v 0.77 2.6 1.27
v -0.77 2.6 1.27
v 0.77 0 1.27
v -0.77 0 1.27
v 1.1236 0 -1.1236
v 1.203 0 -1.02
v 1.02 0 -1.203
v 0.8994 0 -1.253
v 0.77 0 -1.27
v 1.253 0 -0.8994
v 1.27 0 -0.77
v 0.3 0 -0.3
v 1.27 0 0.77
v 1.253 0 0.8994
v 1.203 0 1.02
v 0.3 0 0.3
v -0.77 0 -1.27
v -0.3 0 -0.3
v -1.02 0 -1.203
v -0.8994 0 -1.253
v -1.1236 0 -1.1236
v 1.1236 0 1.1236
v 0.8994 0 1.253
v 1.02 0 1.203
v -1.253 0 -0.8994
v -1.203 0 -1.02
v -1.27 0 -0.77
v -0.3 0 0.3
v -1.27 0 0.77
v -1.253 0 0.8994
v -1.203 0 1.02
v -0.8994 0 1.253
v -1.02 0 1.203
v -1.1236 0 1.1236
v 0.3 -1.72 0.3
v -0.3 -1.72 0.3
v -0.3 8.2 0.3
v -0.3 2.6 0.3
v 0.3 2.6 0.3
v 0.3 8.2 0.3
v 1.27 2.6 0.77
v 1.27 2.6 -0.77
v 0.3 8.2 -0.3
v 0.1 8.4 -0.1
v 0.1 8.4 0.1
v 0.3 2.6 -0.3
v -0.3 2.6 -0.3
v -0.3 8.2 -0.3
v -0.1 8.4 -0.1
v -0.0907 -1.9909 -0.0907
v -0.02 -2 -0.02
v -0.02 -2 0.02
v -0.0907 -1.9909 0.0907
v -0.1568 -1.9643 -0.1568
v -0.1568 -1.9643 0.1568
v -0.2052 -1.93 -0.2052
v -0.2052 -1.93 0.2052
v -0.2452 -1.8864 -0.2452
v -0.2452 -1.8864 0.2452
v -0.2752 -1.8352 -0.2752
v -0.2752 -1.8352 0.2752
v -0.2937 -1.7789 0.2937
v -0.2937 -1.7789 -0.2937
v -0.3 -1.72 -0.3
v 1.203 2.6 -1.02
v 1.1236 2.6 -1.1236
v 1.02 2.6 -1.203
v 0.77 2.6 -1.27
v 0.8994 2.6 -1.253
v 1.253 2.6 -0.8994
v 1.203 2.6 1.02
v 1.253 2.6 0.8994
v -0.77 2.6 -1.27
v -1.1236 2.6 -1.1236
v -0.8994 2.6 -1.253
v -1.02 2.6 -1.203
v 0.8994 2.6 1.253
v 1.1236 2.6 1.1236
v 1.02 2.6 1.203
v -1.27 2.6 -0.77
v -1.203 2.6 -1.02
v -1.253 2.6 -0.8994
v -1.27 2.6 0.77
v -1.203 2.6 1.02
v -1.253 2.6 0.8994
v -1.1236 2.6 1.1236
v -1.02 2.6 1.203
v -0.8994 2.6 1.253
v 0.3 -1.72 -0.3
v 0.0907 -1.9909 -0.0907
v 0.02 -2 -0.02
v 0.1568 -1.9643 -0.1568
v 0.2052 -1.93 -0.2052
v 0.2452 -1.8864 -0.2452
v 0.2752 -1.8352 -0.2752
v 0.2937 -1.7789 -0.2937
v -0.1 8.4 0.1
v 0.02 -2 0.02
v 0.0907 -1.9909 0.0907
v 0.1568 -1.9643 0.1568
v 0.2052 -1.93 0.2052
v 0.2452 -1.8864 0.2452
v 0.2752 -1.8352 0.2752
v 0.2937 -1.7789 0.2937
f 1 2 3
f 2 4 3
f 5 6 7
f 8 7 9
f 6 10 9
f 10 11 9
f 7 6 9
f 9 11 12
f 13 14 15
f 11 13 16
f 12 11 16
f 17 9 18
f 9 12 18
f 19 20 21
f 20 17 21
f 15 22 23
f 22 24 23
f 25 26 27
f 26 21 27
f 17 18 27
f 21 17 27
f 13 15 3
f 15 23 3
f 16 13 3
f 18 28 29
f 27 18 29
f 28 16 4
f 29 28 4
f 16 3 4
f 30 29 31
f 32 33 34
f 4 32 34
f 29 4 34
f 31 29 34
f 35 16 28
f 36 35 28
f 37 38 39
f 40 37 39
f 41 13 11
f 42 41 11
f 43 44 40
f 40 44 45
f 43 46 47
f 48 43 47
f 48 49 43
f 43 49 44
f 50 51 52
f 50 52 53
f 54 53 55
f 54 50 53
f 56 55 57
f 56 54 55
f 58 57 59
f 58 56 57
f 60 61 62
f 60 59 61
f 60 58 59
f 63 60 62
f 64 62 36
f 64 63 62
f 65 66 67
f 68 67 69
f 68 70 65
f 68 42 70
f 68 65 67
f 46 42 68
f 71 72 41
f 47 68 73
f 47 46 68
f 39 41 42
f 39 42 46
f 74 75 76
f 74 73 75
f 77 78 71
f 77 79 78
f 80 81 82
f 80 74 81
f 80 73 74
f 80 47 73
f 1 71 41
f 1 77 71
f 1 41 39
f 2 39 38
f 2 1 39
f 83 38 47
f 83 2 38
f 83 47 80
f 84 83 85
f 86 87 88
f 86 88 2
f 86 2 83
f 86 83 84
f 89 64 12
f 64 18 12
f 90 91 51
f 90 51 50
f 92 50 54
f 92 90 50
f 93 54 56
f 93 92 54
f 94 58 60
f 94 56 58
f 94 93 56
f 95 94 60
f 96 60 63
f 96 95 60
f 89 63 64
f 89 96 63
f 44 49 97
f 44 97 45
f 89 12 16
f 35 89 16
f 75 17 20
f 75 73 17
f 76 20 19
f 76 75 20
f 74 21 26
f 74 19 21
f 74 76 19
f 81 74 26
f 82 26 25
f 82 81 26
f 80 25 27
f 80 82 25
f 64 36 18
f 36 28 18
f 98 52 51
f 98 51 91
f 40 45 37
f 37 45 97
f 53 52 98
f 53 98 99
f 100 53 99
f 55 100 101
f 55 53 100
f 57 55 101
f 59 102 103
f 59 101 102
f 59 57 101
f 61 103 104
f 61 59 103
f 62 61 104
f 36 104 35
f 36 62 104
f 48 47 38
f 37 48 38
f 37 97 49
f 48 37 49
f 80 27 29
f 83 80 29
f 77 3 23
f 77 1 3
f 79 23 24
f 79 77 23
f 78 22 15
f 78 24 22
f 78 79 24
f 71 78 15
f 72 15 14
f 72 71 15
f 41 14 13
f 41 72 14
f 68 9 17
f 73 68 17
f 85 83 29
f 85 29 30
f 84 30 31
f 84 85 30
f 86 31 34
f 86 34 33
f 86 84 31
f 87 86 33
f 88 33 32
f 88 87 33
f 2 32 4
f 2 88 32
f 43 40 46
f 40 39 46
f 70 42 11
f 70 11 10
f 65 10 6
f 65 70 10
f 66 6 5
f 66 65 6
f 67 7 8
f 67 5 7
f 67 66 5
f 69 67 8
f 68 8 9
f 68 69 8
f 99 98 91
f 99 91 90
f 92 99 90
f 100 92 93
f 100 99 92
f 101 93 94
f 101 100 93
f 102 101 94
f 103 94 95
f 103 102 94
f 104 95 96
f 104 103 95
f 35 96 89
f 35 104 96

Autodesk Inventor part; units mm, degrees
ref_plane "YZ Plane" through (0, 0, 0) normal (1, 0, 0) x (0, 1, 0)
ref_plane "XZ Plane" through (0, 0, 0) normal (0, 1, 0) x (-1, 0, 0)
ref_plane "XY Plane" through (0, 0, 0) normal (0, 0, 1) x (1, 0, 0)
sketch "Sketch1" plane through (0, 0, 0) normal (0, 1, 0) x (-1, 0, 0)
  line L0 (1.27, 1.27) -> (-1.27, 1.27)
  line L1 (-1.27, 1.27) -> (-1.27, -1.27)
  line L2 (-1.27, -1.27) -> (1.27, -1.27)
  line L3 (1.27, -1.27) -> (1.27, 1.27)
  line L4 (1.27, 1.27) -> (-1.27, -1.27) construction
  line L5 (-1.27, 1.27) -> (1.27, -1.27) construction
  point P0 (0, 0)
  dimension "d0" = 2.54
  dimension "d1" = 2.54
extrude "Extrusion1" add sketch "Sketch1" along normal blind 2.6
fillet "Fillet1" radius 0.5 4 edges at (1.27, 1.3, 1.27) (1.27, 1.3, -1.27) (-1.27, 1.3, 1.27) (-1.27, 1.3, -1.27)
sketch "Sketch2" plane through (0, 2.6, 0) normal (0, 1, 0) x (1, 0, 0)
  line L0 (-0.3, -0.3) -> (0.3, -0.3)
  line L1 (0.3, -0.3) -> (0.3, 0.3)
  line L2 (0.3, 0.3) -> (-0.3, 0.3)
  line L3 (-0.3, 0.3) -> (-0.3, -0.3)
  line L4 (-0.3, -0.3) -> (0.3, 0.3) construction
  line L5 (0.3, -0.3) -> (-0.3, 0.3) construction
  point P0 (0, 0)
  dimension "d5" = 0.6
  dimension "d6" = 0.6
extrude "Extrusion2" add sketch "Sketch2" along normal blind 5.8
chamfer "Chamfer1" distance 0.2 angle 45 4 edges at (0.3, 8.4, 0) (0, 8.4, 0.3) (-0.3, 8.4, 0) (0, 8.4, -0.3)
sketch "Sketch3" plane through (0, 0, 0) normal (0, -1, 0) x (1, 0, 0)
  line L0 (0.3, 0.3) -> (-0.3, 0.3) projected
  line L1 (-0.3, 0.3) -> (-0.3, -0.3) projected
  line L2 (-0.3, -0.3) -> (0.3, -0.3) projected
  line L3 (0.3, -0.3) -> (0.3, 0.3) projected
  point P0 (0, 0)
extrude "Extrusion3" add sketch "Sketch3" along normal blind 2
fillet "Fillet2" radius 0.28 4 edges at (0, -2, -0.3) (-0.3, -2, 0) (0, -2, 0.3) (0.3, -2, 0)
properties part number "PIR pins"
